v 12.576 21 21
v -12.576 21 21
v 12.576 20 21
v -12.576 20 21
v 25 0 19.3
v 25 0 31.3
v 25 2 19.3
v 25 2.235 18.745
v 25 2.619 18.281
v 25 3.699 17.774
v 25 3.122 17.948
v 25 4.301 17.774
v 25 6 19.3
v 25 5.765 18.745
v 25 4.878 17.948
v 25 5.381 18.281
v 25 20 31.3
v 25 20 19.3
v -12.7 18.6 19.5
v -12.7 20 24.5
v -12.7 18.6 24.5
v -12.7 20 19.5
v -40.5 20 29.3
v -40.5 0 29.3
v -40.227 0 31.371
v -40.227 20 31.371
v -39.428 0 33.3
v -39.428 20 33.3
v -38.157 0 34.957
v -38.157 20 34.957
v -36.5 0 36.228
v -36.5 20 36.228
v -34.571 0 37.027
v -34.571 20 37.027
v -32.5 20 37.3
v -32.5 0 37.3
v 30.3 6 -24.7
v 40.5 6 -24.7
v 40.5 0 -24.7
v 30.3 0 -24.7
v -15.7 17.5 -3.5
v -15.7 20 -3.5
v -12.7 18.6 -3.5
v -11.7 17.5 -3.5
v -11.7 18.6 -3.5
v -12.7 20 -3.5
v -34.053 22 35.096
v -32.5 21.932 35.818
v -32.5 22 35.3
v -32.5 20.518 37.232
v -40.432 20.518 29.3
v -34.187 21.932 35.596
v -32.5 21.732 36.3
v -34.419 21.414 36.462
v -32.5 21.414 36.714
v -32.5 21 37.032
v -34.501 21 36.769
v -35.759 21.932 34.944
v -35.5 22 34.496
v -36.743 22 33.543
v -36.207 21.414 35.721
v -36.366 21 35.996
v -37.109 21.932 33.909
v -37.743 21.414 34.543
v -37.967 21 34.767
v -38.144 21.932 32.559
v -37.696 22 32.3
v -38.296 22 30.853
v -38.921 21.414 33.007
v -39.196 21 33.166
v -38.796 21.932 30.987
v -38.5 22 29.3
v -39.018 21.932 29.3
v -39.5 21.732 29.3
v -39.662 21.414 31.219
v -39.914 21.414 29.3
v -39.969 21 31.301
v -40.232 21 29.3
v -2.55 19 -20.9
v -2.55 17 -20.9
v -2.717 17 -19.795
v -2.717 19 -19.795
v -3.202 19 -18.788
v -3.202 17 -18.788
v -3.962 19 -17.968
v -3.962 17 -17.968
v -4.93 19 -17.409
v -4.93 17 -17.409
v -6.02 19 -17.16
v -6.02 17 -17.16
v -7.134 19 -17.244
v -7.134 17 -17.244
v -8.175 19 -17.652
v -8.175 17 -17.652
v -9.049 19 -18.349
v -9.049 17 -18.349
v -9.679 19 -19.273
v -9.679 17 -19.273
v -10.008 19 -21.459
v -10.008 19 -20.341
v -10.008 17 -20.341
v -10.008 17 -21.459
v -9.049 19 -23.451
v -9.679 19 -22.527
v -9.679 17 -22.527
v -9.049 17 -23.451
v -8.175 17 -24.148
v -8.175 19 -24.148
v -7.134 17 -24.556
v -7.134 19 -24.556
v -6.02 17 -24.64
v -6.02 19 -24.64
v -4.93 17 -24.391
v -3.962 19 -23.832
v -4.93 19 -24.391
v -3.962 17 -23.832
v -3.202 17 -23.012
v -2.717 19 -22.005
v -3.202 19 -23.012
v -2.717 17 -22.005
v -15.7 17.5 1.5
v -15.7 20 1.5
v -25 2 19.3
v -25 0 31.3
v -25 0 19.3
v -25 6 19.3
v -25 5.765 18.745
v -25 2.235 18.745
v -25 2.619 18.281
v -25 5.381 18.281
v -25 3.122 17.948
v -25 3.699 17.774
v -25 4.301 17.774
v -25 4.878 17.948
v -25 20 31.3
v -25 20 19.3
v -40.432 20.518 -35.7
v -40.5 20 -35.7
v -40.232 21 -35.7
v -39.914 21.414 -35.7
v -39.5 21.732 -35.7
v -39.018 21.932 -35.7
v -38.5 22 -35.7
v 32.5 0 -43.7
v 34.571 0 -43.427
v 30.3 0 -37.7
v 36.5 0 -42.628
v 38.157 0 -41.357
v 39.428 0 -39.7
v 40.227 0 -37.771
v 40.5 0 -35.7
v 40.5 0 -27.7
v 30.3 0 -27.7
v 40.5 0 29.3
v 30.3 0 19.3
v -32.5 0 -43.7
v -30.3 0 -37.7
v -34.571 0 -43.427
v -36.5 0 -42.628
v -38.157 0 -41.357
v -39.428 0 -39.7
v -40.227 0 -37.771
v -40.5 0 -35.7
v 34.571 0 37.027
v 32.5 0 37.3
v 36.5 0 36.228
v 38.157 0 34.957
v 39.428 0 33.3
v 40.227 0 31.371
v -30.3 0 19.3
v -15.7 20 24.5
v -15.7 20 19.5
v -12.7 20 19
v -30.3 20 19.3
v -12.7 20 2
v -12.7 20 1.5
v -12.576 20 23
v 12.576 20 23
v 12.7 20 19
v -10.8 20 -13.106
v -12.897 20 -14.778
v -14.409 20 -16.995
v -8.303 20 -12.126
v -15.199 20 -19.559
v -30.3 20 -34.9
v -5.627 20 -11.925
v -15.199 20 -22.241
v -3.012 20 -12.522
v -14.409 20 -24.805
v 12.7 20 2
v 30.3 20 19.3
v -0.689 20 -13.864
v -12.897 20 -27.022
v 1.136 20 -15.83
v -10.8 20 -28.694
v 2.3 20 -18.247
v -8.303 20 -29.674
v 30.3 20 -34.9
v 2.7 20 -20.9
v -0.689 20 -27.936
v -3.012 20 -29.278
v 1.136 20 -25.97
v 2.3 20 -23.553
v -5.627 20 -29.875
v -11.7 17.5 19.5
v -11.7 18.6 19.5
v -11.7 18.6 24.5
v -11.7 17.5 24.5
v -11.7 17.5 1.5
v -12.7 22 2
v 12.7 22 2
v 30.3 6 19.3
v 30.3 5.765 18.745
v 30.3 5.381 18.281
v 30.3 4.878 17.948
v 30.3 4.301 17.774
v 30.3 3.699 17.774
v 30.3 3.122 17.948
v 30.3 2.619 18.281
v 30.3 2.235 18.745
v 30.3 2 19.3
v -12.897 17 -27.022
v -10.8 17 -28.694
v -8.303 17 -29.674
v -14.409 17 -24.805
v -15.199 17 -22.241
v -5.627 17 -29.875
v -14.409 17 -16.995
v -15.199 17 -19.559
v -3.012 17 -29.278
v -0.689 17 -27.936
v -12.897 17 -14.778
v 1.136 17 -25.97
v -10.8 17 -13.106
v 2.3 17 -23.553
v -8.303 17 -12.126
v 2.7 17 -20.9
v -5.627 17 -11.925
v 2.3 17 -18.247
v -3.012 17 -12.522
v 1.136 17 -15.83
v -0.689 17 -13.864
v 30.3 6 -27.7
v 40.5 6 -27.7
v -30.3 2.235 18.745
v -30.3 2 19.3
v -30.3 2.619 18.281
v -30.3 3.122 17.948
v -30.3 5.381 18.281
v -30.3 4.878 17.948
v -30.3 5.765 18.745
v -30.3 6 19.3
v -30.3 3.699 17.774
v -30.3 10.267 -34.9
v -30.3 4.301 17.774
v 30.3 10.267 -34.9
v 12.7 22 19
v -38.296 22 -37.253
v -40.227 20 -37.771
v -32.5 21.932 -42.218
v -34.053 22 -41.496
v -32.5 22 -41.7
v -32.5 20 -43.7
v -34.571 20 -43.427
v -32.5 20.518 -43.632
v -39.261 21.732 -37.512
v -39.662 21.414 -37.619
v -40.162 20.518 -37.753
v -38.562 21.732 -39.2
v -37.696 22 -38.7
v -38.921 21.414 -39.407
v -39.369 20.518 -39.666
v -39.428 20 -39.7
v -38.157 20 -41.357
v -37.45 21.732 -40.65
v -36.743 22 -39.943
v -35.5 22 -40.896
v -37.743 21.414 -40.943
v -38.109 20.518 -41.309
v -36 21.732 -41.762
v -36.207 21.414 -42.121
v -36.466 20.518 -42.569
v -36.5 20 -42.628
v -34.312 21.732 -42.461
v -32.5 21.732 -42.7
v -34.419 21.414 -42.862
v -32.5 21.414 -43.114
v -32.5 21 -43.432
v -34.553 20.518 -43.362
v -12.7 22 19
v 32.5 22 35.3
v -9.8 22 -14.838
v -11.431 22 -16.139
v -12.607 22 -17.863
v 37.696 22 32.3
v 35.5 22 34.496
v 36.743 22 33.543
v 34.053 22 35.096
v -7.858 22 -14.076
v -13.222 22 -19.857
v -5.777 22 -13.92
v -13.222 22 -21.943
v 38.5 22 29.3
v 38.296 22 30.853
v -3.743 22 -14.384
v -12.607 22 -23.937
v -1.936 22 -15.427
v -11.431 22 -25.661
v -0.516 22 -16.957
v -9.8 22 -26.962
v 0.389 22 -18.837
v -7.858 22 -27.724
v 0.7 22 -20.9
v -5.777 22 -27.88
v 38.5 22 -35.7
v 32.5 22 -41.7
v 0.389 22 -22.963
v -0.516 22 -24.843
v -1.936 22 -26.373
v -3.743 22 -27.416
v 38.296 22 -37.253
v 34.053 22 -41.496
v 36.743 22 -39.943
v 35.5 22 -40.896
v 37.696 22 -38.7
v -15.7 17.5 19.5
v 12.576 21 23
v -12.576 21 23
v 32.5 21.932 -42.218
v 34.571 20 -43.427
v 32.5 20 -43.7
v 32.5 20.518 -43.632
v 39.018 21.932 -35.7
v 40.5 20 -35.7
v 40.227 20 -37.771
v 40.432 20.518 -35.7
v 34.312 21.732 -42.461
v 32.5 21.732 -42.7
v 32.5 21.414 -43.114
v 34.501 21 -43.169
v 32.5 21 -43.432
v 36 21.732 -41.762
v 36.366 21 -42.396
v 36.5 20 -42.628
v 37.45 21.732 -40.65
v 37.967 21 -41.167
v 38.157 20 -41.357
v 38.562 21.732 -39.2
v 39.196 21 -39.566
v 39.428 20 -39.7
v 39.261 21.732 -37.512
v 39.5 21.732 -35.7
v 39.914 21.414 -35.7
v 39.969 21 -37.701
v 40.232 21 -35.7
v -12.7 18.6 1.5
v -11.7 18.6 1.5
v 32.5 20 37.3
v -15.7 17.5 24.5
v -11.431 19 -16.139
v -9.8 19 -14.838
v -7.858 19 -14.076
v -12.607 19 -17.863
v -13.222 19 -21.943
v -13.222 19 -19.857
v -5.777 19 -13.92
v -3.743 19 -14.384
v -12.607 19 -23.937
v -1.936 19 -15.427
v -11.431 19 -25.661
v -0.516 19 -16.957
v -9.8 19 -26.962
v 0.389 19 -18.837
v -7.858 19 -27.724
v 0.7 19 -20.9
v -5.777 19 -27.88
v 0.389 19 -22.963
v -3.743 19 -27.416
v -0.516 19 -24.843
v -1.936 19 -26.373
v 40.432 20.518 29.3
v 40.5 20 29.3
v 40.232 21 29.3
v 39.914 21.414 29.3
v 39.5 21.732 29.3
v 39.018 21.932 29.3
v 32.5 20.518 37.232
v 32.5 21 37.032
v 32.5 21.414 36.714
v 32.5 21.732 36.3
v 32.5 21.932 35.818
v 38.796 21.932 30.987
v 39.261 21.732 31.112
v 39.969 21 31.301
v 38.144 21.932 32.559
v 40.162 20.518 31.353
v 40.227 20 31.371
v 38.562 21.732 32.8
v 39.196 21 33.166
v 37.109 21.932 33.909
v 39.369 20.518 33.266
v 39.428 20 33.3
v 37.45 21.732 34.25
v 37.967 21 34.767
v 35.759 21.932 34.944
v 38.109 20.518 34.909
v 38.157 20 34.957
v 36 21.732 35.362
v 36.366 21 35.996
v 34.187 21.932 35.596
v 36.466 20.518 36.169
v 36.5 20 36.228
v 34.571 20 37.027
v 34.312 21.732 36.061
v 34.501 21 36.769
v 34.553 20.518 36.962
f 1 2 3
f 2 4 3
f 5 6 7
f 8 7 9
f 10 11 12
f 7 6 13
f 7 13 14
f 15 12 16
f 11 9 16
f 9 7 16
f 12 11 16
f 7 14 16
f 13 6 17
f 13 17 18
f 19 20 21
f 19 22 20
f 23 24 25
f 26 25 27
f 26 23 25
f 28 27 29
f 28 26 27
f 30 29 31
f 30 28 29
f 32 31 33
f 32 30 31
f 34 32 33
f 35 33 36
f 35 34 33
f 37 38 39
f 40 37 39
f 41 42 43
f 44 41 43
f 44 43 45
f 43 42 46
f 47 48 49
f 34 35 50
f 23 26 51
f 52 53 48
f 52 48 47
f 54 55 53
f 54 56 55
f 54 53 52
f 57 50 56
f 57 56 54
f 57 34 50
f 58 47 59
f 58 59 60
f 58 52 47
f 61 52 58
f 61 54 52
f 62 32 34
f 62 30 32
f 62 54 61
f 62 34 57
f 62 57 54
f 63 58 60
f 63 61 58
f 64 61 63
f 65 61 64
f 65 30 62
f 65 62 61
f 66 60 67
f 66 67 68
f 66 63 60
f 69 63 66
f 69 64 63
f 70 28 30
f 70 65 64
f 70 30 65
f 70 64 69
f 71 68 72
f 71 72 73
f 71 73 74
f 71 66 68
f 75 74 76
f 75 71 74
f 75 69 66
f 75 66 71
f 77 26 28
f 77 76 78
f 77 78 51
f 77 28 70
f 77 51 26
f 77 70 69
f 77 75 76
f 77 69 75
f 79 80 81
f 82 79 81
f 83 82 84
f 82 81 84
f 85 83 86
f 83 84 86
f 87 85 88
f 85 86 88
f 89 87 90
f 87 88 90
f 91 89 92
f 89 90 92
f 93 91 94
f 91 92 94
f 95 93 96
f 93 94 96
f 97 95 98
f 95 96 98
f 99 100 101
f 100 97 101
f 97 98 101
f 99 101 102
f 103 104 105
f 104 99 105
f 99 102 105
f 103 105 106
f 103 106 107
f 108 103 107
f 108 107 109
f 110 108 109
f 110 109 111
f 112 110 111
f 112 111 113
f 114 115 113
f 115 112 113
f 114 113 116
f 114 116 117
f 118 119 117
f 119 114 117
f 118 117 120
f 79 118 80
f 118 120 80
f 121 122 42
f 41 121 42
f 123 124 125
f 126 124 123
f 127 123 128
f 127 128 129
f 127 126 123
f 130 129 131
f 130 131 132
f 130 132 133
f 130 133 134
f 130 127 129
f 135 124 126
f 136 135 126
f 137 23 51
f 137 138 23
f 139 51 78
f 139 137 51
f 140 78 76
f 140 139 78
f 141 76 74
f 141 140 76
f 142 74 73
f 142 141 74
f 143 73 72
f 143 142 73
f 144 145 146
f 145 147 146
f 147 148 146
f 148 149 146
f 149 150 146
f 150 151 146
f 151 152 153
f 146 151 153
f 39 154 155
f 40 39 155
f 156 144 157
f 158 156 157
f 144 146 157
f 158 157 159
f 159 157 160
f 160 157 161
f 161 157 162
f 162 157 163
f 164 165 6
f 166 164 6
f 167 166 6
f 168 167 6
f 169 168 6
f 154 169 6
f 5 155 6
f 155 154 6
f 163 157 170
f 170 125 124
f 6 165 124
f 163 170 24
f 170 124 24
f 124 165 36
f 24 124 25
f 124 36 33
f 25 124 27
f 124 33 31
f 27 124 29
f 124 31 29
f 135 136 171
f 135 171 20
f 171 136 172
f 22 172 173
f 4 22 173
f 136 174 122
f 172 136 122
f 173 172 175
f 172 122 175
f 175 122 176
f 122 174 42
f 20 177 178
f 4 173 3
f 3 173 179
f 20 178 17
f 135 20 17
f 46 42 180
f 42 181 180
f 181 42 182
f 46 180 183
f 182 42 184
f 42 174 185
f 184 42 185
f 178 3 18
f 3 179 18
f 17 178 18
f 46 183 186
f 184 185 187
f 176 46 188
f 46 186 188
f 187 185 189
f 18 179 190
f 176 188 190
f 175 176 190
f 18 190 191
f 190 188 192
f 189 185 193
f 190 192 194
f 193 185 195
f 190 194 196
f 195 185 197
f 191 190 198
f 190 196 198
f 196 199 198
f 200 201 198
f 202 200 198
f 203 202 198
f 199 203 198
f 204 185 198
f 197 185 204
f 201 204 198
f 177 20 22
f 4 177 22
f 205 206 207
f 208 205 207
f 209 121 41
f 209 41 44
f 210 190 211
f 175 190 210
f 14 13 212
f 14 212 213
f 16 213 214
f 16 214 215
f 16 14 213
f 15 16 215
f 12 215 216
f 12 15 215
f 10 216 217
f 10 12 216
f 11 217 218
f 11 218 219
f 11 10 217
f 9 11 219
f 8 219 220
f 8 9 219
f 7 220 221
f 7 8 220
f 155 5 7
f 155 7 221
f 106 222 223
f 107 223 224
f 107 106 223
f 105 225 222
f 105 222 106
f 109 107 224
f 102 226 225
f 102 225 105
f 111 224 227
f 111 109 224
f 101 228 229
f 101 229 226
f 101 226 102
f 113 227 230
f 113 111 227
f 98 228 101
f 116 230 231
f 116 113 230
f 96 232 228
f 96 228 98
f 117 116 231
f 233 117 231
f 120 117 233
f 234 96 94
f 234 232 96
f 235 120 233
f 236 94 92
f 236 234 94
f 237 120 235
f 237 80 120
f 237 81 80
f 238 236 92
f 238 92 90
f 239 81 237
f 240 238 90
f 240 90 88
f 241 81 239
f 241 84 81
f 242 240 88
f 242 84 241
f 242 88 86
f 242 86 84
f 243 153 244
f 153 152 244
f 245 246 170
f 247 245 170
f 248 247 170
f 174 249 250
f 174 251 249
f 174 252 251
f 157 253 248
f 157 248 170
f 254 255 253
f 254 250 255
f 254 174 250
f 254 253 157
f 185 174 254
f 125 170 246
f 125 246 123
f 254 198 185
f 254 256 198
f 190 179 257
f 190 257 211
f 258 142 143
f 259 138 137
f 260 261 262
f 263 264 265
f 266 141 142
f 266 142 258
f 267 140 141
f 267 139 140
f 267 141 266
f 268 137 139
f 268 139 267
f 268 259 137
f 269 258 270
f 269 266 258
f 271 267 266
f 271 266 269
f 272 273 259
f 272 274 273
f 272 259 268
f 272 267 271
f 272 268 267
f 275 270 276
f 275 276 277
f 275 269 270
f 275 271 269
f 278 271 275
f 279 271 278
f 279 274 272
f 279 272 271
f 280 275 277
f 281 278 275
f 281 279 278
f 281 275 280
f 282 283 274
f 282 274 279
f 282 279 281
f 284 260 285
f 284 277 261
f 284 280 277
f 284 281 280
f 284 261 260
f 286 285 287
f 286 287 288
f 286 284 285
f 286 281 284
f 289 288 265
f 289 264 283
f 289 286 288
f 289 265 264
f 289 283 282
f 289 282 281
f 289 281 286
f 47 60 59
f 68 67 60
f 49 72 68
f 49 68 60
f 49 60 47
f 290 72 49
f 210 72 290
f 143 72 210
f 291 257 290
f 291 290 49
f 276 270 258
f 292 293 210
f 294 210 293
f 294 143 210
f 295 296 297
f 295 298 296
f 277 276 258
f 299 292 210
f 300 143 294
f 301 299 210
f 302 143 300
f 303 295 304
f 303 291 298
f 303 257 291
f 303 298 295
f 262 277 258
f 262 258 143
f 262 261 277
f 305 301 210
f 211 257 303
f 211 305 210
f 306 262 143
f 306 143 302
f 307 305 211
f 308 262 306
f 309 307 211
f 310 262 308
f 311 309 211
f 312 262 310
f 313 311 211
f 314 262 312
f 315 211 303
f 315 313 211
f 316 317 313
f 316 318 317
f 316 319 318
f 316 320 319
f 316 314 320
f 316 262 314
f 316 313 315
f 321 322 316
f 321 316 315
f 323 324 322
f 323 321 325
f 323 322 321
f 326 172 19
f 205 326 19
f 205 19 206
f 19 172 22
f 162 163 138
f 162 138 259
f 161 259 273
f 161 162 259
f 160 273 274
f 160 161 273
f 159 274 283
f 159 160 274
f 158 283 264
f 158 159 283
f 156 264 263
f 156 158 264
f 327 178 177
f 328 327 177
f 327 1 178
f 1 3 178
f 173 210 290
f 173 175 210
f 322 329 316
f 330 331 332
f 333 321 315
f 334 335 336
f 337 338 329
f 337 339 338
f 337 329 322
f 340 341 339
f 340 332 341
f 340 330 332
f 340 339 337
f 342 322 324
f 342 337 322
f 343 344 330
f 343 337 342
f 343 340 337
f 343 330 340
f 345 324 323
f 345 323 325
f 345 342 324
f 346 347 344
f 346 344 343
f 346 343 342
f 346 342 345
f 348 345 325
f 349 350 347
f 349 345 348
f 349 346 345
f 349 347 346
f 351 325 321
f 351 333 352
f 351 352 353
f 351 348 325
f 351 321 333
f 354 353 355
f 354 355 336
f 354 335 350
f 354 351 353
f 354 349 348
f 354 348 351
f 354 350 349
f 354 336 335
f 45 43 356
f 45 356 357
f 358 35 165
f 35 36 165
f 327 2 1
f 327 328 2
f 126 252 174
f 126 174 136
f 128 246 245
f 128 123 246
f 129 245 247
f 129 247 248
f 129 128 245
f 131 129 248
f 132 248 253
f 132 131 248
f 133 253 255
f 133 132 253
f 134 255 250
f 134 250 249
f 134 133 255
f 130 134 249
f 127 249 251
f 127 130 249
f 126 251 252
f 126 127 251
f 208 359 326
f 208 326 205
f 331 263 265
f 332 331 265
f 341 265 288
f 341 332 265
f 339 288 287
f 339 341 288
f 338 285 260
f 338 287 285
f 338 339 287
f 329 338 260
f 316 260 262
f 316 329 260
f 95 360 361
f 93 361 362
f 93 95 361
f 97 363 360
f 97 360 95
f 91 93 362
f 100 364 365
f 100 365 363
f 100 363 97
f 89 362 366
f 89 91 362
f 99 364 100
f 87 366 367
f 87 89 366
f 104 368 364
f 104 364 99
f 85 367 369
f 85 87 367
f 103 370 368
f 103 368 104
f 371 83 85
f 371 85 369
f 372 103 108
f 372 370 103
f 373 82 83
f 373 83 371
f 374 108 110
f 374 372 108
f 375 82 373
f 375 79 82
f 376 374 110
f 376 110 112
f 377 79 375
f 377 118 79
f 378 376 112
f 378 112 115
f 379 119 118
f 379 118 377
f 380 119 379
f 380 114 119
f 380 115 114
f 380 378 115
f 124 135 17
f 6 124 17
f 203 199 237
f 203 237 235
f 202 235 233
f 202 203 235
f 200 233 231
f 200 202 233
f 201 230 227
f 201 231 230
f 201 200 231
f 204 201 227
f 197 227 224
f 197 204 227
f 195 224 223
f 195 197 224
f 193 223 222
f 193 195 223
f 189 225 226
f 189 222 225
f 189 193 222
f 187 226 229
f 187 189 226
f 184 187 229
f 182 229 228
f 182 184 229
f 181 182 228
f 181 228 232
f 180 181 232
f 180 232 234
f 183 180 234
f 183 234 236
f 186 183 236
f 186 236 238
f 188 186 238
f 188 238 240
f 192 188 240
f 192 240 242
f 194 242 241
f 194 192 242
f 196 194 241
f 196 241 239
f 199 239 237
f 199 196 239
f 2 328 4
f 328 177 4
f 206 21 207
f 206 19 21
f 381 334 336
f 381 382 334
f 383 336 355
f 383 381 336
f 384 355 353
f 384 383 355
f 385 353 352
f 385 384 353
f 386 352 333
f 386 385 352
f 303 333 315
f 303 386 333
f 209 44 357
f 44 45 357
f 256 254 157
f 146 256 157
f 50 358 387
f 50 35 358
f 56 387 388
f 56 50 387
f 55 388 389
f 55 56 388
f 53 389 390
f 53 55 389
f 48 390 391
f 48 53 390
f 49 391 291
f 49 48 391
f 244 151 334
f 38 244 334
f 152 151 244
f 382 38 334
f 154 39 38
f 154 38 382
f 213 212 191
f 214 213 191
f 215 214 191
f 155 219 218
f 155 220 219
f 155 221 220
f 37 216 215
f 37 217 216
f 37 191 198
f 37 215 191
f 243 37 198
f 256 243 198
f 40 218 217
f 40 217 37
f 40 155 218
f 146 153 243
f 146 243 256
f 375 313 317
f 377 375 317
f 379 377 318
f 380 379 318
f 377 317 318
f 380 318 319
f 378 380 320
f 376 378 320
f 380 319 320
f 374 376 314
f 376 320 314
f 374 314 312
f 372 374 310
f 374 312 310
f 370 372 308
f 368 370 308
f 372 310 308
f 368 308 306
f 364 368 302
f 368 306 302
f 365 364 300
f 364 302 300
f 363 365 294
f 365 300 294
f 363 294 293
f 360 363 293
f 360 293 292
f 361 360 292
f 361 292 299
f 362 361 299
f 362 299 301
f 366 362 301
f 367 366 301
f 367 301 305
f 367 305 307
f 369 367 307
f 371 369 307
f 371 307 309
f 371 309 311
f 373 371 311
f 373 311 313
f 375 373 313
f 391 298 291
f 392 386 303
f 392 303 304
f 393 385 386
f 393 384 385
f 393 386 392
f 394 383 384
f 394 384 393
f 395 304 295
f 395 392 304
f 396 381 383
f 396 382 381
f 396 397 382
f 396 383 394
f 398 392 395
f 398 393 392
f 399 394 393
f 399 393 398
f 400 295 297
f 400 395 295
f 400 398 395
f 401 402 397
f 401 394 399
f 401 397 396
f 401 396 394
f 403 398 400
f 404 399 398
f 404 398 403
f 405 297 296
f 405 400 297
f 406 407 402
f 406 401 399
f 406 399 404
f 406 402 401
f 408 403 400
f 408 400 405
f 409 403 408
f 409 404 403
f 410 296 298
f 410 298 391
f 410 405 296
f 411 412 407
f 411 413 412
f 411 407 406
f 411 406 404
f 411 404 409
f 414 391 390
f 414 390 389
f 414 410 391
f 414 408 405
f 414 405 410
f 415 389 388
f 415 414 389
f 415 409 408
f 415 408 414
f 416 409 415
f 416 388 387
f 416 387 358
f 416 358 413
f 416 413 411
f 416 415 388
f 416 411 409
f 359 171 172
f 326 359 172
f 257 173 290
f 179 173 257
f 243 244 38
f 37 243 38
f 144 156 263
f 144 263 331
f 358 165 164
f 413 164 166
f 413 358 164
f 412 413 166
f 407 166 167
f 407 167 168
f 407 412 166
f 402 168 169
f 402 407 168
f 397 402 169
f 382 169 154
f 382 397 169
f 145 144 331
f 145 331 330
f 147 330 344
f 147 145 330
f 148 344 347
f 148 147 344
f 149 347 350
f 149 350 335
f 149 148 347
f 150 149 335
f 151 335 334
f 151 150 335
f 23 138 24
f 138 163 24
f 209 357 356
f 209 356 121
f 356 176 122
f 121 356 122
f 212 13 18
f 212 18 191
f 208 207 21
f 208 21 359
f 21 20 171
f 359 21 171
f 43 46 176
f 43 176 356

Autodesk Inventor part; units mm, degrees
ref_plane "YZ Plane" through (0, 0, 0) normal (1, 0, 0) x (0, 1, 0)
ref_plane "XZ Plane" through (0, 0, 0) normal (0, 1, 0) x (-1, 0, 0)
ref_plane "XY Plane" through (0, 0, 0) normal (0, 0, 1) x (1, 0, 0)
sketch "Skizze1" plane through (0, 0, 0) normal (0, 1, 0) x (-1, 0, 0)
  line L0 (30.3, 19.3) -> (-30.3, 19.3)
  line L1 (-30.3, 19.3) -> (-30.3, -34.9)
  line L2 (-30.3, -34.9) -> (30.3, -34.9)
  line L3 (30.3, -34.9) -> (30.3, 19.3)
  line L4 (40.5, -43.7) -> (-40.5, -43.7)
  line L5 (-40.5, -43.7) -> (-40.5, 37.3)
  line L6 (-40.5, 37.3) -> (40.5, 37.3)
  line L7 (40.5, 37.3) -> (40.5, -43.7)
  point P0 (0, 0)
  dimension "d0" = 30.3
  dimension "d1" = 60.6
  dimension "d2" = 54.2
  dimension "d3" = 19.3
  dimension "d4" = 81
  dimension "d5" = 81
  dimension "d6" = 40.5
  dimension "d7" = 18
extrude "Extrusion1" add sketch "Skizze1" along normal blind 20
sketch "Skizze2" plane through (0, 0, 0) normal (0, -1, 0) x (1, 0, 0)
  line L0 (-40.5, 37.3) -> (40.5, 37.3)
  line L1 (40.5, 37.3) -> (40.5, -43.7)
  line L2 (40.5, -43.7) -> (-40.5, -43.7)
  line L3 (-40.5, -43.7) -> (-40.5, 37.3)
  point P0 (0, 0)
sketch "Skizze3" plane through (0, 20, 0) normal (0, 1, 0) x (1, 0, 0)
  line L0 (30.3, -19.3) -> (-30.3, -19.3) projected
  line L1 (25, -19.3) -> (-25, -19.3)
  line L2 (-25, -19.3) -> (-25, -31.3)
  line L3 (-25, -31.3) -> (25, -31.3)
  line L4 (25, -31.3) -> (25, -19.3)
  point P0 (0, 0)
  point P1 (-25, -19.3)
  dimension "d12" = 12
  dimension "d13" = 50
  dimension "d14" = 25
extrude "Extrusion3" cut sketch "Skizze3" against normal blind 20
sketch "Skizze4" plane through (0, 20, 0) normal (0, 1, 0) x (1, 0, 0)
  line L0 (-40.5, -37.3) -> (40.5, -37.3) projected
  line L1 (-40.5, 43.7) -> (-40.5, -37.3) projected
  line L2 (40.5, -37.3) -> (-40.5, -37.3)
  line L3 (-40.5, -37.3) -> (-40.5, 43.7)
  line L4 (-40.5, 43.7) -> (40.5, 43.7)
  line L5 (40.5, 43.7) -> (40.5, -37.3)
  point P0 (0, 0)
extrude "Extrusion4" add sketch "Skizze4" along normal blind 2
sketch "Skizze5" plane through (0, 20, 0) normal (0, -1, 0) x (1, 0, 0)
  line L0 (-12.7, 19) -> (12.7, 19)
  line L1 (12.7, 19) -> (12.7, 2)
  line L2 (12.7, 2) -> (-12.7, 2)
  line L3 (-12.7, 2) -> (-12.7, 19)
  point P0 (0, 0)
  dimension "d19" = 25.4
  dimension "d20" = 17
  dimension "d21" = 12.7
  dimension "d22" = 2
extrude "Extrusion5" cut sketch "Skizze5" against normal blind 20
sketch "Skizze6" plane through (0, 20, 0) normal (0, -1, 0) x (1, 0, 0)
  line L0 (-12.5757, 21) -> (12.5757, 21)
  line L1 (12.5757, 21) -> (12.5757, 23)
  line L2 (12.5757, 23) -> (-12.5757, 23)
  line L3 (-12.5757, 23) -> (-12.5757, 21)
  line L4 (-12.7, 19) -> (12.7, 19) projected
  point P0 (0, 0)
  dimension "d25" = 2
  dimension "d26" = 2
extrude "Extrusion6" cut sketch "Skizze6" against normal blind 1
sketch "Skizze7" plane through (0, 20, 0) normal (0, -1, 0) x (1, 0, 0)
  line L0 (-15.7, -3.5) -> (-11.7, -3.5)
  line L1 (-11.7, -3.5) -> (-11.7, 1.5)
  line L2 (-11.7, 1.5) -> (-15.7, 1.5)
  line L3 (-15.7, 1.5) -> (-15.7, -3.5)
  line L4 (-15.7, 19.5) -> (-11.7, 19.5)
  line L5 (-11.7, 19.5) -> (-11.7, 24.5)
  line L6 (-11.7, 24.5) -> (-15.7, 24.5)
  line L7 (-15.7, 24.5) -> (-15.7, 19.5)
  line L8 (12.7, 2) -> (-12.7, 2) projected
  line L9 (-12.7, 19) -> (12.7, 19) projected
  line L10 (-12.7, 2) -> (-12.7, 19) projected
  point P0 (0, 0)
  point P1 (-11.7, 22)
  dimension "d29" = 4
  dimension "d30" = 0.5
  dimension "d31" = 5
  dimension "d32" = 5
  dimension "d33" = 0.5
  dimension "d34" = 1
extrude "Extrusion7" add sketch "Skizze7" along normal blind 2.5
sketch "Skizze8" plane through (-11.7, 20, -3.5) normal (0, 0, -1) x (-1, 0, 0)
  line L0 (0, 0) -> (0, -2.5) projected
  line L1 (0, 0) -> (1, 0)
  line L2 (1, 0) -> (1, -1.4)
  line L3 (1, -1.4) -> (0, -1.4)
  line L4 (0, -1.4) -> (0, 0)
  point P0 (-11.7, -20)
  point P1 (0, -1.4)
  dimension "d37" = 1
  dimension "d38" = 1.4
extrude "Extrusion8" cut sketch "Skizze8" against normal blind 29.5
fillet "Rundung1" radius 8 4 edges at (40.5, 11, 37.3) (40.5, 11, -43.7) (-40.5, 11, 37.3) (-40.5, 11, -43.7)
fillet "Rundung2" radius 2 8 edges at (38.1569, 22, -41.3569) (0, 22, -43.7) (-38.1569, 22, -41.3569) (-40.5, 22, -3.2) (-38.1569, 22, 34.9569) (0, 22, 37.3) (38.1569, 22, 34.9569) (40.5, 22, -3.2)
sketch "Skizze9" plane through (-30.3, 0, 19.3) normal (1, 0, 0) x (0, 0, -1)
  line L0 (54, 11) -> (57, 0)
  line L1 (63, 0) -> (55, 0) projected
  line L2 (57, 0) -> (54, 0)
  line L3 (54, 0) -> (54, 11)
  line L4 (53.8, 6) -> (53.8, 11) projected
  line L5 (53.8, 6) -> (53.8, 2) projected
  line L6 (49.8, 6) -> (53.8, 6) projected
  line L7 (49.8, 2) -> (49.8, 6) projected
  line L8 (49.8, 2) -> (53.8, 2) projected
  line L9 (49.8, 6) -> (53.8, 6) projected
  line L10 (53.8, 6) -> (53.8, 11) projected
  line L11 (49.8, 11) -> (53.8, 11) projected
  line L12 (49.8, 8.9) -> (49.8, 11) projected
  line L13 (49.8, 8.9) -> (51.8, 8.9) projected
  line L14 (51.8, 8.9) -> (51.8, 7) projected
  line L15 (51.8, 7) -> (49.8, 7) projected
  line L16 (49.8, 6) -> (49.8, 7) projected
  point P0 (19.3, 0)
  dimension "d45" = 11
  dimension "d46" = 9
  dimension "d47" = 3
extrude "Extrusion9" cut sketch "Skizze9" along normal up to surface (60.6 mm away) contours L0 L1 L2 L3
sketch "Skizze10" plane through (-25, 0, 31.3) normal (1, 0, 0) x (0, 0, -1)
  line L0 (16.3, 6) -> (12.3, 6) projected
  line L1 (12.3, 2) -> (31.3, 2) projected
  line L2 (12, 0) -> (12, 20) projected
  arc A0 (12, 2) -> (12, 6) centre (11.4824, 4) ccw
  line L3 (12, 2) -> (12, 6)
  point P0 (31.3, 0)
extrude "Extrusion10" add sketch "Skizze10" against normal blind 10
sketch "Skizze11" plane through (25, 0, 19.3) normal (-1, 0, 0) x (0, 0, 1)
  line L0 (12, 20) -> (0, 20) projected
  line L1 (12, 20) -> (12, 0) projected
  line L2 (0, 0) -> (12, 0) projected
  line L3 (0, 2) -> (0, 0) projected
  arc A0 (0, 6) -> (0, 2) centre (0.5176, 4) ccw projected
  line L4 (0, 20) -> (0, 6) projected
  line L5 (0, 6) -> (0, 2)
  line L6 (0, 0) -> (0, 20) projected
  arc A1 (0, 2) -> (0, 2) centre (0.512, 3.9787) ccw
  point P0 (-19.3, 0)
extrude "Extrusion11" add sketch "Skizze11" against normal blind 10 contours A0 L5 A1 | A1 L5 picked at (-0.1516, 3.3785)
sketch "Skizze12" plane through (0, 20, 0) normal (0, -1, 0) x (1, 0, 0)
  circle A0 centre (-6.3, -20.9) radius 3.75
  line L0 (-30.3, -34.9) -> (30.3, -34.9) projected
  line L1 (-30.3, 19.3) -> (-30.3, -37.7) projected
  point P0 (0, 0)
  dimension "d52" = 14
  dimension "d53" = 24
  dimension "d54" = 7.5
extrude "Extrusion12" cut sketch "Skizze12" against normal blind 10
sketch "Skizze13" plane through (0, 20, 0) normal (0, -1, 0) x (1, 0, 0)
  circle A0 centre (-6.3, -20.9) radius 4.75
  circle A1 centre (-6.3, -20.9) radius 9
  point P0 (0, 0)
  dimension "d57" = 18
  dimension "d70" = 9.5
extrude "Extrusion13" add sketch "Skizze13" along normal blind 3 contours A0 | A1
sketch "Skizze14" plane through (-6.3, 20, -20.9) normal (0, 1, 0) x (1, 0, 0)
  circle A0 centre (0, 0) radius 3.75 projected
  point P0 (6.3, -20.9)
extrude "Extrusion14" cut sketch "Skizze14" against normal through all
sketch "Skizze15" plane through (0, 22, 0) normal (0, 1, 0) x (1, 0, 0)
  circle A0 centre (-6.3, 20.9) radius 3.75 projected
  circle A1 centre (-6.3, 20.9) radius 7
  point P0 (0, 0)
  dimension "d62" = 14
extrude "Extrusion15" cut sketch "Skizze15" against normal blind 3
sketch "Skizze16" plane through (40.5, 0, 29.3) normal (1, 0, 0) x (0, 0, -1)
  line L0 (67, 0) -> (10, 0) projected
  line L1 (54, 0) -> (57, 0)
  line L2 (57, 0) -> (57, 6)
  line L3 (57, 6) -> (54, 6)
  line L4 (54, 6) -> (54, 0)
  line L5 (73, 0) -> (73, 20) projected
  point P0 (29.3, 0)
  dimension "d65" = 6
  dimension "d66" = 3
  dimension "d67" = 16
extrude "Extrusion16" cut sketch "Skizze16" against normal blind 27.75
equation "\"d0\" = 0.5 * d1"
equation "\"d6\" = 0.5 * d4"
equation "\"d14\" = 0.5 * d13"
equation "\"d21\" = 0.5 * d19"
properties part number "Deckel"
